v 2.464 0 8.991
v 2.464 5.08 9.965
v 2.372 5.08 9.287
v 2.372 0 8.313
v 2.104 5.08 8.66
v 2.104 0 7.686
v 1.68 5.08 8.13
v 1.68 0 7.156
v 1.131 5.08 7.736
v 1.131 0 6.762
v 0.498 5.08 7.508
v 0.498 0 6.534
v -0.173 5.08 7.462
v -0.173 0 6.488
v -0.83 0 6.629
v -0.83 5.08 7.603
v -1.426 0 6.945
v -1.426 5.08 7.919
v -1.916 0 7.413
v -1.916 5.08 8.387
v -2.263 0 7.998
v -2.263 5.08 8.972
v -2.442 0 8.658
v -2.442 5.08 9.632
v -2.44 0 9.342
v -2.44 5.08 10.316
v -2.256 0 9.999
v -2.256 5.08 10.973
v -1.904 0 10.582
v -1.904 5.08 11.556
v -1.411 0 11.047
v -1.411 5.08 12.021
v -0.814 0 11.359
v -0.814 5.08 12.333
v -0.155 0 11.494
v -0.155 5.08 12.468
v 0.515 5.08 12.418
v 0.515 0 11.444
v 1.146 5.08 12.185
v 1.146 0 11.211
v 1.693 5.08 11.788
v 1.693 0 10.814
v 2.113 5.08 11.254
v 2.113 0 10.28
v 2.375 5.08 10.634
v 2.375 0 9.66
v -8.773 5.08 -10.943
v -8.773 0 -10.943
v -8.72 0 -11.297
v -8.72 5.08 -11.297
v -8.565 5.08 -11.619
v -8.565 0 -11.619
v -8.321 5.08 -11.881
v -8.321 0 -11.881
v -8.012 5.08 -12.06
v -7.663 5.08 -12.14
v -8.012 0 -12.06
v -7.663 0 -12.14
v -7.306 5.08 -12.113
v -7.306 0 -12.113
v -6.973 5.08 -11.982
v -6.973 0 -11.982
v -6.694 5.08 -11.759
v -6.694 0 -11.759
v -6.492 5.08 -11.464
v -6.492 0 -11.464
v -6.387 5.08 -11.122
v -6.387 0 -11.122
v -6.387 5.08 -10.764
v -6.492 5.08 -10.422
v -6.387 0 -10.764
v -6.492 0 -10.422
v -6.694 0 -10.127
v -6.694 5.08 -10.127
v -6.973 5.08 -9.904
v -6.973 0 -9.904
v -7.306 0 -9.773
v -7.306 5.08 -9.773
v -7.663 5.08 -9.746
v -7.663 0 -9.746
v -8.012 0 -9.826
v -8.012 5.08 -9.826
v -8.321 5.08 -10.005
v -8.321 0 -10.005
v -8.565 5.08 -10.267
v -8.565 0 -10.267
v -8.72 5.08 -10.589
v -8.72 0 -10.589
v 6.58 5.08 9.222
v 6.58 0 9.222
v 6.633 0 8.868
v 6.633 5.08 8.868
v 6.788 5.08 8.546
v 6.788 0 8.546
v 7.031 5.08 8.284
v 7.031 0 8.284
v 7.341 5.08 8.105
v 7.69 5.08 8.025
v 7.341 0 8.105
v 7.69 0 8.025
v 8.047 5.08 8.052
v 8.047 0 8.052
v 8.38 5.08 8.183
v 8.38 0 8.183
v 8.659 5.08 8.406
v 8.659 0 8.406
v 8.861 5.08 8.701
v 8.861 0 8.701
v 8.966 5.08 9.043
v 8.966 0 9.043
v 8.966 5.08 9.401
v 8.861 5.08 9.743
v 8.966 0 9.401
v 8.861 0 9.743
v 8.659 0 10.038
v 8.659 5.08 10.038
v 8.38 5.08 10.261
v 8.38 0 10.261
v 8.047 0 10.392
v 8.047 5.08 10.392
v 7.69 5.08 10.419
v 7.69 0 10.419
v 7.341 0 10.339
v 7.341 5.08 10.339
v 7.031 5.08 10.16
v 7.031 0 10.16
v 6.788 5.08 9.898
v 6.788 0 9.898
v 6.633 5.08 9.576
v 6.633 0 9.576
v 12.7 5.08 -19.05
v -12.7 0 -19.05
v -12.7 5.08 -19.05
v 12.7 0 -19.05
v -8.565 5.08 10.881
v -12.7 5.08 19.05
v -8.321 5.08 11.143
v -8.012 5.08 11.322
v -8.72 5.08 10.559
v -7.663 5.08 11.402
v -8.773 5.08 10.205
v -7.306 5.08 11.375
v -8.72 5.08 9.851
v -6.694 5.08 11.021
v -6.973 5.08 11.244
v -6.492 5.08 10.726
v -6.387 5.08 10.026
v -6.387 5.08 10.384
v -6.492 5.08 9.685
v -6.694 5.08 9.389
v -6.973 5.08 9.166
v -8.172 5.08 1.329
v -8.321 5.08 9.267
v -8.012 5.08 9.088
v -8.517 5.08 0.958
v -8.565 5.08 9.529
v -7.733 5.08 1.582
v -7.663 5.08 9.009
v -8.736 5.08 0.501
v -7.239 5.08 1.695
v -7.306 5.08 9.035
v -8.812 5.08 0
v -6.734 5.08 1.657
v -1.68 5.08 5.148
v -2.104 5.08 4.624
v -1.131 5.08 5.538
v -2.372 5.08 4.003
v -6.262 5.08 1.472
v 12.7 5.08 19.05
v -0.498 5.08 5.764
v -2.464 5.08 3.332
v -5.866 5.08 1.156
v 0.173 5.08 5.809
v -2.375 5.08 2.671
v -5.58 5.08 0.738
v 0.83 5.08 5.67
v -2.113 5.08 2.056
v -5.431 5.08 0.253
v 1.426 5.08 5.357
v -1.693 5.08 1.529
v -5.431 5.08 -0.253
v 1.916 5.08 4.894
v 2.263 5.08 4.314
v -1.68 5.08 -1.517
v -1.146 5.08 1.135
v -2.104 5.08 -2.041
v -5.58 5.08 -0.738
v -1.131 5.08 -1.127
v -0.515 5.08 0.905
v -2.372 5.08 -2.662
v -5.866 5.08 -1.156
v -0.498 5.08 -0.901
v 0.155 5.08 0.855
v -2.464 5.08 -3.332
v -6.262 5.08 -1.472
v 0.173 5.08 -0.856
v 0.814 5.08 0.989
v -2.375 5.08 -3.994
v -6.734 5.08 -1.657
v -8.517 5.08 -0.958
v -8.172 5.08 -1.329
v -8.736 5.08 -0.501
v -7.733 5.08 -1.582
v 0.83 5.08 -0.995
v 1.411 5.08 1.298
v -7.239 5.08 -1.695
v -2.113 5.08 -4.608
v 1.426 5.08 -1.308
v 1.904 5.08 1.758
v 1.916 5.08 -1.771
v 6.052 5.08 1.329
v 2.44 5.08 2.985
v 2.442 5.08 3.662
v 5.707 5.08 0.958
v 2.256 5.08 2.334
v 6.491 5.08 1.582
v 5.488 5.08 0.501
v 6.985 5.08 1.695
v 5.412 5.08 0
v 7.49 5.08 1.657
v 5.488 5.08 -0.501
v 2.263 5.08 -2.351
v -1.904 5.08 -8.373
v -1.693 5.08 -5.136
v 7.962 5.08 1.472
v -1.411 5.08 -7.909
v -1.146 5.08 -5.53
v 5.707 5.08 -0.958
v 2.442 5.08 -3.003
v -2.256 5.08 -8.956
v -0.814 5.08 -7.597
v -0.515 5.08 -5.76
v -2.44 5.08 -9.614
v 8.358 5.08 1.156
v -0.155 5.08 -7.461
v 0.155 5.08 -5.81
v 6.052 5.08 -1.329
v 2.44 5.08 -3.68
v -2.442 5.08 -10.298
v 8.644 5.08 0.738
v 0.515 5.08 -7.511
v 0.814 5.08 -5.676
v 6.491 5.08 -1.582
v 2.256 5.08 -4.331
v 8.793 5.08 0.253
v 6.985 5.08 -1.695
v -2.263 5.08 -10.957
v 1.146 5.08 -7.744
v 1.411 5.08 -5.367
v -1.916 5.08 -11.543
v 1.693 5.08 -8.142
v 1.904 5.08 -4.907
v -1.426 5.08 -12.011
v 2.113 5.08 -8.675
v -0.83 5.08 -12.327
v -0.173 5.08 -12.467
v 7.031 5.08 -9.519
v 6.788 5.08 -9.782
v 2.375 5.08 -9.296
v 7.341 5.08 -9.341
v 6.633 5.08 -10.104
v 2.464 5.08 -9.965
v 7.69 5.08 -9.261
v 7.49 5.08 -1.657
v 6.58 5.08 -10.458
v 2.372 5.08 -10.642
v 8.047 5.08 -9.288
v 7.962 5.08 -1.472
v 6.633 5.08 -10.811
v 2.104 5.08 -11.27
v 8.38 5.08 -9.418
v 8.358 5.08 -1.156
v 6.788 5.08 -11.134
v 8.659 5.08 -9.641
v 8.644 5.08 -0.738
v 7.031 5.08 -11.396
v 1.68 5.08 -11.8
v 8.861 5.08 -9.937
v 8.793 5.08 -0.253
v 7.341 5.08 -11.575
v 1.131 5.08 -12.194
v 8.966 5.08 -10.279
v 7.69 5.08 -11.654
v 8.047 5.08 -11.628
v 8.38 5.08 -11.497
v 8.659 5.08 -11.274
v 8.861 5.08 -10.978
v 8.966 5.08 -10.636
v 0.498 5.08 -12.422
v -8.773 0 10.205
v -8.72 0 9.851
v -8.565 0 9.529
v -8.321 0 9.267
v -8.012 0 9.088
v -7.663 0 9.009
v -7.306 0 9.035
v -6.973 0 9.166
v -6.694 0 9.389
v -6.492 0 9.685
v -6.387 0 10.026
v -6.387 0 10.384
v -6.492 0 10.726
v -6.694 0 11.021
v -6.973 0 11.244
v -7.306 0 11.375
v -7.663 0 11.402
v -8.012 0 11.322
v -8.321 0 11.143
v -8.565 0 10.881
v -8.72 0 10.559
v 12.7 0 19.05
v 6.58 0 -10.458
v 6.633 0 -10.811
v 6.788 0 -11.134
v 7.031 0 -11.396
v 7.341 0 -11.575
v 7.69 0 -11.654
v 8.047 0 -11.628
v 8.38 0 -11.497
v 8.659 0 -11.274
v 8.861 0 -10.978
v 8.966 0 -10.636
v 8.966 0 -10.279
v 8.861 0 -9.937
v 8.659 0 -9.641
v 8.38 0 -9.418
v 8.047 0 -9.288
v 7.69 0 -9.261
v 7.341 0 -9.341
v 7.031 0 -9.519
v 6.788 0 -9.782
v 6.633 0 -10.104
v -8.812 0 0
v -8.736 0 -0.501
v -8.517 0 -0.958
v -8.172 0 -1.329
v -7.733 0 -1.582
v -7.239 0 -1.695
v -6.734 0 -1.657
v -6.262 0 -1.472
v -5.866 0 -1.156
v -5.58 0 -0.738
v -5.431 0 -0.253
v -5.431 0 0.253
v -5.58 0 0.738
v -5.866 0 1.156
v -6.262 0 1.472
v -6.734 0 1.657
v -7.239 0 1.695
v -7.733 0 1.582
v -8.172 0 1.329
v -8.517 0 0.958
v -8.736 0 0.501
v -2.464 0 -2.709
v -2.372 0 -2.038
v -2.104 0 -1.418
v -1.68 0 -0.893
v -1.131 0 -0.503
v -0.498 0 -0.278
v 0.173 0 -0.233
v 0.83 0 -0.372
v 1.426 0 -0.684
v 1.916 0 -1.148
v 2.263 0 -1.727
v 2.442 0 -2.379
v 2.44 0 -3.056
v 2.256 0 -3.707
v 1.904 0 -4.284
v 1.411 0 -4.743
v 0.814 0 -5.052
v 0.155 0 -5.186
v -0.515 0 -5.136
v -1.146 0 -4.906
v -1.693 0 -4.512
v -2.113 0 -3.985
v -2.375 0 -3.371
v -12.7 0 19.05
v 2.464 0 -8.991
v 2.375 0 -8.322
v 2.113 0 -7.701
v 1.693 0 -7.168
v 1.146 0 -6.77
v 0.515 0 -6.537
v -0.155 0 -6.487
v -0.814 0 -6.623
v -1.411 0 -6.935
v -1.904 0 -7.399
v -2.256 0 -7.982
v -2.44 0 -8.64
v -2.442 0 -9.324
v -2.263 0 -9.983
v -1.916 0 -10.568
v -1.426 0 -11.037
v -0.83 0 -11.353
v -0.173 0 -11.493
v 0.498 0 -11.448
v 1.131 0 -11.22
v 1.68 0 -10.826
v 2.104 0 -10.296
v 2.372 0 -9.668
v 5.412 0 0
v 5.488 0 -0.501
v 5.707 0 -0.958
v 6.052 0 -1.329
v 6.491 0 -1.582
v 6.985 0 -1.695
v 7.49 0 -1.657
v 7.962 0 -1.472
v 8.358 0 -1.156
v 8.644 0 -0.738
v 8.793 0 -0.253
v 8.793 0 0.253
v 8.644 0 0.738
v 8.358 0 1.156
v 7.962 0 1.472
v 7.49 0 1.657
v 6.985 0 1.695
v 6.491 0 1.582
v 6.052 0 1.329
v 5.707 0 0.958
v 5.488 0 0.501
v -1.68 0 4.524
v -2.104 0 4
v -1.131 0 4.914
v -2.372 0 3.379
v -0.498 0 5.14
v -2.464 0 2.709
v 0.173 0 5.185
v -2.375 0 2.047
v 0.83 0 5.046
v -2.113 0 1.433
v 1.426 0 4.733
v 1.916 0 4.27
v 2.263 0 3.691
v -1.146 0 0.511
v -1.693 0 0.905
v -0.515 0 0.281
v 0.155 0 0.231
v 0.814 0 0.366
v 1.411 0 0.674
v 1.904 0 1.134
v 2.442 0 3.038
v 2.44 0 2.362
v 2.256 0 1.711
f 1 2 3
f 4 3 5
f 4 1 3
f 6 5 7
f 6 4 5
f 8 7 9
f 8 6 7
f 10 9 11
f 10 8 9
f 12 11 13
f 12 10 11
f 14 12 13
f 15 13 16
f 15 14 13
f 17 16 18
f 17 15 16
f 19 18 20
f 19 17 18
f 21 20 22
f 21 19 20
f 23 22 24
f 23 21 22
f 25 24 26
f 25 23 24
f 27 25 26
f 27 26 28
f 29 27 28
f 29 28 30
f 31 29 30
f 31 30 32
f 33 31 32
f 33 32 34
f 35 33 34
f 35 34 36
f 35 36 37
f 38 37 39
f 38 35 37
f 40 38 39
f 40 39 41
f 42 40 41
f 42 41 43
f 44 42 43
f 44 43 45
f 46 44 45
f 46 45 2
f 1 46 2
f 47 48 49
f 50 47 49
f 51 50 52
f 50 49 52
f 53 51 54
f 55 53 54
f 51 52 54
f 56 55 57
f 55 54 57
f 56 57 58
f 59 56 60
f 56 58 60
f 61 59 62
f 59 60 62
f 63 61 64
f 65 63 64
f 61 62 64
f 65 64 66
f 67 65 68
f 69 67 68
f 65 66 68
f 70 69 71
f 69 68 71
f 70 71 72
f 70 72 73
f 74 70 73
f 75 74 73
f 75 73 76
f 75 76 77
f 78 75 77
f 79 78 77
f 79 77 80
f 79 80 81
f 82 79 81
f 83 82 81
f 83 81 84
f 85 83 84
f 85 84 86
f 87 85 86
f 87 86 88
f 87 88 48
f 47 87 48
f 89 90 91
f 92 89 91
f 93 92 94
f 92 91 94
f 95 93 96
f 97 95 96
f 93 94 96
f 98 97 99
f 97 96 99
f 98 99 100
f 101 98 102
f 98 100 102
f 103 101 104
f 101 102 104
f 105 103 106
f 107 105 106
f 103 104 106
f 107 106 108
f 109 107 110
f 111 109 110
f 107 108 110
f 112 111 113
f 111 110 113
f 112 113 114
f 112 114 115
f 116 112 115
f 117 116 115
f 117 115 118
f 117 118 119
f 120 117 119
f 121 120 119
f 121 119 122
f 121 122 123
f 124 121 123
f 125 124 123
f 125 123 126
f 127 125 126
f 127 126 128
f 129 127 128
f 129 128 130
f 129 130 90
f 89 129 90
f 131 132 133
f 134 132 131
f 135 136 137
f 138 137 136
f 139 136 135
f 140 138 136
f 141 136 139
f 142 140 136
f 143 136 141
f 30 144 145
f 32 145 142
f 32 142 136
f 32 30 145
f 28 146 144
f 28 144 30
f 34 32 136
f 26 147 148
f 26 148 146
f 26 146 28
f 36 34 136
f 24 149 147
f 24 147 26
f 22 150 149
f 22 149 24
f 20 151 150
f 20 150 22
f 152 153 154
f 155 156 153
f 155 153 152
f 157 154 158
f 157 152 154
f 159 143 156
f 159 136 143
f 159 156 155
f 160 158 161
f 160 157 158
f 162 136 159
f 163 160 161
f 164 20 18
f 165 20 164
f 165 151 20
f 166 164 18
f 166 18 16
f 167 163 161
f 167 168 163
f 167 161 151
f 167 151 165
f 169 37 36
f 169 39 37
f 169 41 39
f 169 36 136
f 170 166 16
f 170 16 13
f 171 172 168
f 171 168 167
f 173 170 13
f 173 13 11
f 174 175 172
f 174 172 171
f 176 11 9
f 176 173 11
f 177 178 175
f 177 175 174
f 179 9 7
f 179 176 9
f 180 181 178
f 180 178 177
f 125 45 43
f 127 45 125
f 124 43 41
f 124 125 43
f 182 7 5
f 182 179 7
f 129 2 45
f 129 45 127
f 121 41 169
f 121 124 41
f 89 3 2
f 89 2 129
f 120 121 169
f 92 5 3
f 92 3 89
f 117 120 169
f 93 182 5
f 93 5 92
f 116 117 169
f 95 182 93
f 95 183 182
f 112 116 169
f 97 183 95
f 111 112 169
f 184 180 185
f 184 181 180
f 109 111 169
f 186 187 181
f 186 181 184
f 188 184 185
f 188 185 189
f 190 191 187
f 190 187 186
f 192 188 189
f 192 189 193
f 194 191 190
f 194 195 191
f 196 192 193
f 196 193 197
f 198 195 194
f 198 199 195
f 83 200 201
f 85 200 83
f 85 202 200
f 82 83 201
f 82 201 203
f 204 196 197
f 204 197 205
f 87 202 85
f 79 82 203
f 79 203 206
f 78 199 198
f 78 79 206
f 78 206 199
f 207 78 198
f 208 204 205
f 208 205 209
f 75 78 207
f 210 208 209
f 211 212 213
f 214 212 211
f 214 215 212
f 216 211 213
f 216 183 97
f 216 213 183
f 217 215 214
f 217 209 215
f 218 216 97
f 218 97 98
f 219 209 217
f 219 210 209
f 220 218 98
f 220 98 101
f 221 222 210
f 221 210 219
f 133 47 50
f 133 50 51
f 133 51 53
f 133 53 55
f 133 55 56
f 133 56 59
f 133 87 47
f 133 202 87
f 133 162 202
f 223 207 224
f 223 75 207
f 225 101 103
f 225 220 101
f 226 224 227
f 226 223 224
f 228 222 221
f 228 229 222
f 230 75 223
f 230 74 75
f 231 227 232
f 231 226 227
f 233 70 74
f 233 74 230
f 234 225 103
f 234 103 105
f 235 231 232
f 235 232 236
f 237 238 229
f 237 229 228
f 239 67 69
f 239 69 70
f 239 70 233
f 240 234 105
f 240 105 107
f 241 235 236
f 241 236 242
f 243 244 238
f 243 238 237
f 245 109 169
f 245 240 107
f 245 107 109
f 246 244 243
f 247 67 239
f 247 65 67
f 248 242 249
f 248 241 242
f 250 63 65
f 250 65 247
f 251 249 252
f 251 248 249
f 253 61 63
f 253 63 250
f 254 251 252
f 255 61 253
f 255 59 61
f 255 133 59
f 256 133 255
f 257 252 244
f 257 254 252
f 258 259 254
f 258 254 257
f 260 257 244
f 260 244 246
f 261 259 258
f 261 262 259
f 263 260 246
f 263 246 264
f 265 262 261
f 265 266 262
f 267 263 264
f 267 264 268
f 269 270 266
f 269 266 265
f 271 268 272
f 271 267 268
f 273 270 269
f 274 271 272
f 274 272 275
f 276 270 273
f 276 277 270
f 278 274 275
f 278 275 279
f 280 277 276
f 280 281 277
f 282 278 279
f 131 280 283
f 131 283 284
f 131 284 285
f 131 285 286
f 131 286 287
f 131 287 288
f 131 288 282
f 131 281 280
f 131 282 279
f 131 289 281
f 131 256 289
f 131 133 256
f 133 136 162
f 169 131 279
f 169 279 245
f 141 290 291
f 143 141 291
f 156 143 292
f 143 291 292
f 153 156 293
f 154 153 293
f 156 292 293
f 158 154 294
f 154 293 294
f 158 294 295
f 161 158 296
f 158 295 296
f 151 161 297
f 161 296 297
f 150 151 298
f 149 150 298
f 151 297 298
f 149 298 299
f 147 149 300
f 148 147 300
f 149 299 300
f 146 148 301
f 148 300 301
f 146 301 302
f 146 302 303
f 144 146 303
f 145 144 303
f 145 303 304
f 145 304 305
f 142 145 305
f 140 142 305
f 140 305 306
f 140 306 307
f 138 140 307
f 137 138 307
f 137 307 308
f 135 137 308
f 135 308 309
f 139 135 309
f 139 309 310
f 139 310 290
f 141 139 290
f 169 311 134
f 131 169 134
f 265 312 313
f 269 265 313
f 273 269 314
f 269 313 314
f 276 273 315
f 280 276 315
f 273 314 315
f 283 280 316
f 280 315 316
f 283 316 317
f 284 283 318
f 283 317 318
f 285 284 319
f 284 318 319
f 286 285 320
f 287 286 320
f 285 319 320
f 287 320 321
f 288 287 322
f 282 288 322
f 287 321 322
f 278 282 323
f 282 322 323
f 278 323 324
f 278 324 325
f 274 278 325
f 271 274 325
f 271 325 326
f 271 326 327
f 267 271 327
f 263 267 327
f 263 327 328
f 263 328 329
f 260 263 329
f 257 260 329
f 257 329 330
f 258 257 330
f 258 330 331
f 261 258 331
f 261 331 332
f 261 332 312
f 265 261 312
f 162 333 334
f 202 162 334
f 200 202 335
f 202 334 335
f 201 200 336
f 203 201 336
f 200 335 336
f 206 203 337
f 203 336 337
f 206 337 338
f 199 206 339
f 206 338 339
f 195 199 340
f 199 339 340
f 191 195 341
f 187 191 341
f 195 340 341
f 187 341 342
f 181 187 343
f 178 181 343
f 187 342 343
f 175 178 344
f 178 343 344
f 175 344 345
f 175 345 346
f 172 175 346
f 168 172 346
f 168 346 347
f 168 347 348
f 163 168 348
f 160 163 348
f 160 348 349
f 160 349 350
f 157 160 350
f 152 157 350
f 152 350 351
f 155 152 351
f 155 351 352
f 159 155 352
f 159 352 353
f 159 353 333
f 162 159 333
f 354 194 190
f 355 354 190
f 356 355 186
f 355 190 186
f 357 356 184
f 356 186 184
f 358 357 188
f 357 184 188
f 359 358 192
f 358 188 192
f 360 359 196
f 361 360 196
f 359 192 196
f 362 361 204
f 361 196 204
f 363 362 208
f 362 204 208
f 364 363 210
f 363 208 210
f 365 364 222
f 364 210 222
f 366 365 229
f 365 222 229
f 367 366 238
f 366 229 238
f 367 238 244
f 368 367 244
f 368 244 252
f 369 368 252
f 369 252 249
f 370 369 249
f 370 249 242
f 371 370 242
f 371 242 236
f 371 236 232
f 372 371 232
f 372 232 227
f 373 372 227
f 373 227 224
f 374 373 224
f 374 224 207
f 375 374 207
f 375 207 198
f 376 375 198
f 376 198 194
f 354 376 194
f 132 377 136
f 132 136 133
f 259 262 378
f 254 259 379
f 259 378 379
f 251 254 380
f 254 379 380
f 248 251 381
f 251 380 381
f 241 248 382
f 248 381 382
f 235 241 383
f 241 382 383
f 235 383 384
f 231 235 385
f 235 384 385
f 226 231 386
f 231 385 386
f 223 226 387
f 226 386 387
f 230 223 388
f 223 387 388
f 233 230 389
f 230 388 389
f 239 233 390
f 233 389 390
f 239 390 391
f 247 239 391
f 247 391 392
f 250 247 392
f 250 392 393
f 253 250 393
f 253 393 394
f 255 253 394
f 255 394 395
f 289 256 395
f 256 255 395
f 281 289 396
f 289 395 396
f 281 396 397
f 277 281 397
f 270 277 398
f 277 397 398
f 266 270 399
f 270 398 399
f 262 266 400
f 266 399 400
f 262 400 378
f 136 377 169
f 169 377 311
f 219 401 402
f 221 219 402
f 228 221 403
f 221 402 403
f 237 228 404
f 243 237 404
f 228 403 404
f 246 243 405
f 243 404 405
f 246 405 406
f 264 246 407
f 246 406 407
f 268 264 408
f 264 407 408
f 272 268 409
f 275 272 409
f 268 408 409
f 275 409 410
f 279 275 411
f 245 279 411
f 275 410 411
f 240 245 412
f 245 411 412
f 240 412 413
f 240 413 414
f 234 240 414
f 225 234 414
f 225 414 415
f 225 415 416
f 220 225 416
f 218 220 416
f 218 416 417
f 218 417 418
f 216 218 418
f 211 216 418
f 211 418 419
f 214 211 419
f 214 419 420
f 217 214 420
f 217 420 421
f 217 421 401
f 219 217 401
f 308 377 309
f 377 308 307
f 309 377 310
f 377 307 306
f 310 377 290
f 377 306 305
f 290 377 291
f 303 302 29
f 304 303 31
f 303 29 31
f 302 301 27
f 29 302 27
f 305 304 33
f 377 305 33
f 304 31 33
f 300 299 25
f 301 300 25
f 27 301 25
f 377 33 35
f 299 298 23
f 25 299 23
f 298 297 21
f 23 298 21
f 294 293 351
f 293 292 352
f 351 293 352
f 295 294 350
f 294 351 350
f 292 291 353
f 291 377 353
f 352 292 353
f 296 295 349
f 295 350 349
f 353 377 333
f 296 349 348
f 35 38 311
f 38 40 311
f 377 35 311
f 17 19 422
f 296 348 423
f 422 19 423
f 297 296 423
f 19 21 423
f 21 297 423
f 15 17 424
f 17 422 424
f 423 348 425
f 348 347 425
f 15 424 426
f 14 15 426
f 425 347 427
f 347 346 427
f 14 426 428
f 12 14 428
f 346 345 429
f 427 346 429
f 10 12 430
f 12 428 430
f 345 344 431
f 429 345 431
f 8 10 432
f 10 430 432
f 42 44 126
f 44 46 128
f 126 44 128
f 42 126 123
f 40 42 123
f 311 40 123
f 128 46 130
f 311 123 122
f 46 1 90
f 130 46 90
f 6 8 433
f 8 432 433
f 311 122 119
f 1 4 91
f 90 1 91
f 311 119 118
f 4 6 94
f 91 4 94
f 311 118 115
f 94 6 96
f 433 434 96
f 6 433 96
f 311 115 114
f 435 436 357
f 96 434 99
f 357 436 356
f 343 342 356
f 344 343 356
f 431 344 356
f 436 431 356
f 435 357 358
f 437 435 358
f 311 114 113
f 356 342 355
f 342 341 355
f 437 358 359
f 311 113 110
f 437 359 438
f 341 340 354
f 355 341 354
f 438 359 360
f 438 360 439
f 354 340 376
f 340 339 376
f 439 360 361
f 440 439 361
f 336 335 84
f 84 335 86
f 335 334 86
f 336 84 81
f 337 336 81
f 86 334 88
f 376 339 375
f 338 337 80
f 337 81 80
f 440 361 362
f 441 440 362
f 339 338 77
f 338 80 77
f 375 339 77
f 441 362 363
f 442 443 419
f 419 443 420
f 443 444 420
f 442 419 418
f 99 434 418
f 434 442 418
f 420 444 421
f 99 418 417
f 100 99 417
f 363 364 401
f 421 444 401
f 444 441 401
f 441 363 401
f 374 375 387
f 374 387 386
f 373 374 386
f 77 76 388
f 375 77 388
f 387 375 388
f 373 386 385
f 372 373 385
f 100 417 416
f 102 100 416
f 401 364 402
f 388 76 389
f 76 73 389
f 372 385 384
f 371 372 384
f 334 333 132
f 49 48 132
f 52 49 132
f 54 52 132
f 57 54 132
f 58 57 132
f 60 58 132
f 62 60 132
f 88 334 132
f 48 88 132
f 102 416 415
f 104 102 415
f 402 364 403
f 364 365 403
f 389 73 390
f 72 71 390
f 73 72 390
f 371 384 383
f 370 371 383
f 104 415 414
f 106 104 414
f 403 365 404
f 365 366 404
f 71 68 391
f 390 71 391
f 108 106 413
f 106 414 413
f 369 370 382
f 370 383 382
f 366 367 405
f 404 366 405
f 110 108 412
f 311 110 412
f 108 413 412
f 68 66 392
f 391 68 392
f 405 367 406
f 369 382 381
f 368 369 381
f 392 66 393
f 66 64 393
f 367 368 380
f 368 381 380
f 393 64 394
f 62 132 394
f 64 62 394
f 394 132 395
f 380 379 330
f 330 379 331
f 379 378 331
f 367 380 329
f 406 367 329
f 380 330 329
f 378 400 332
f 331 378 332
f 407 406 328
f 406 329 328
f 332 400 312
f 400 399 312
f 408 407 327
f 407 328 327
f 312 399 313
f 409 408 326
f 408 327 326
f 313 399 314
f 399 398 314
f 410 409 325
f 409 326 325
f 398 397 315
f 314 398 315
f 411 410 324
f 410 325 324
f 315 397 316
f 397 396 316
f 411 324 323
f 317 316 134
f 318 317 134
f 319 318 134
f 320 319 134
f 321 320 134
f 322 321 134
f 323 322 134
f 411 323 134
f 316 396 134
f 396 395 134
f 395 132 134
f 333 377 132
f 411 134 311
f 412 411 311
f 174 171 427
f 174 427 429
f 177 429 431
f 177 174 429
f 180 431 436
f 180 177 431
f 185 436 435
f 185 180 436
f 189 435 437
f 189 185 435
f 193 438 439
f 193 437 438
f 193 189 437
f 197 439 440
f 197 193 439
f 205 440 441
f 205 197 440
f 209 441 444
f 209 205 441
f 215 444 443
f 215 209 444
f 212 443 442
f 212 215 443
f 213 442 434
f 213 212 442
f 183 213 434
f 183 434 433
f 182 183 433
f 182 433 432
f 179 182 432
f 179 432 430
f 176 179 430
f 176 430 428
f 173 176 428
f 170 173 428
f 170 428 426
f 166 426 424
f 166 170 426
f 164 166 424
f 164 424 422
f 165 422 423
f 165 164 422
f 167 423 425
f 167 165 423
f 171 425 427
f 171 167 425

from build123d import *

# Parameters (mm, degrees)
SKETCH2_W                = 25.4
SKETCH2_H                = 38.1
BOSS_EXTRUDE1_DEPTH      = 5.08
CUT_EXTRUDE1_START       = -2.790735945
SKETCH7_R                = 2.4638
CUT_EXTRUDE1_DEPTH       = 11.685356434
CUT_EXTRUDE2_START       = -12.037410464
SKETCH16_R               = 2.4638
CUT_EXTRUDE2_DEPTH       = 14.163842911
M3_CLEARANCE_HOLE1_D     = 3.4
M3_CLEARANCE_HOLE1_DEPTH = 25.4
M3_CLEARANCE_HOLE1_TIP   = 1.021463052
M2_CLEARANCE_HOLE1_D     = 2.4
M2_CLEARANCE_HOLE1_DEPTH = 25.4
M2_CLEARANCE_HOLE1_TIP   = 0.721032743
M2_CLEARANCE_HOLE2_D     = 2.4
M2_CLEARANCE_HOLE2_DEPTH = 25.4
M2_CLEARANCE_HOLE2_TIP   = 0.721032743


with BuildPart() as part:
    # Sketch2 → Boss-Extrude1 (new body)
    with BuildSketch(Plane(origin=(0, 0, 0), x_dir=(1, 0, 0), z_dir=(0, 1, 0))):
        Rectangle(SKETCH2_W, SKETCH2_H)
    extrude(amount=BOSS_EXTRUDE1_DEPTH)

    # Sketch7 → Cut-Extrude1 (cut)
    with BuildSketch(Plane(origin=(12.7, 5.08, 4.3561), x_dir=(-1, 0, 0), z_dir=(0, -0.992546152, -0.121869343)).offset(CUT_EXTRUDE1_START)):
        with Locations((12.7, 1.016)):
            Circle(SKETCH7_R)
    cut_extrude1 = extrude(amount=CUT_EXTRUDE1_DEPTH, mode=Mode.SUBTRACT)

    # Sketch16 → Cut-Extrude2 (cut)
    with BuildSketch(Plane(origin=(12.7, 5.08, 13.0683), x_dir=(1, 0, 0), z_dir=(0, 0.982109046, 0.188313096)).offset(CUT_EXTRUDE2_START)):
        with Locations((-12.7, 3.048)):
            Circle(SKETCH16_R)
    cut_extrude2 = extrude(amount=CUT_EXTRUDE2_DEPTH, mode=Mode.SUBTRACT)

    # Mirror2: Cut-Extrude1, Cut-Extrude2 across plane
    add(cut_extrude1.mirror(Plane(origin=(0, 0, 0), x_dir=(1, 0, 0), z_dir=(0, 0, -1))), mode=Mode.SUBTRACT)
    add(cut_extrude2.mirror(Plane(origin=(0, 0, 0), x_dir=(1, 0, 0), z_dir=(0, 0, -1))), mode=Mode.SUBTRACT)

    # M3 Clearance Hole1
    with Locations(Plane(origin=(0, 5.08, 0), x_dir=(1, 0, 0), z_dir=(0, 1, 0))):
        with Locations((7.112, 0), (-7.112, 0)):
            Hole(M3_CLEARANCE_HOLE1_D / 2, depth=M3_CLEARANCE_HOLE1_DEPTH)
            with Locations((0, 0, -(M3_CLEARANCE_HOLE1_DEPTH + M3_CLEARANCE_HOLE1_TIP / 2))):  # 118° drill point
                Cone(0, M3_CLEARANCE_HOLE1_D / 2, M3_CLEARANCE_HOLE1_TIP, mode=Mode.SUBTRACT)

    # M2 Clearance Hole1
    with Locations(Plane(origin=(0, 5.08, 0), x_dir=(1, 0, 0), z_dir=(0, 1, 0))):
        with Locations((-7.573257477, -10.205203742), (-7.573257477, 10.942943937)):
            Hole(M2_CLEARANCE_HOLE1_D / 2, depth=M2_CLEARANCE_HOLE1_DEPTH)
            with Locations((0, 0, -(M2_CLEARANCE_HOLE1_DEPTH + M2_CLEARANCE_HOLE1_TIP / 2))):  # 118° drill point
                Cone(0, M2_CLEARANCE_HOLE1_D / 2, M2_CLEARANCE_HOLE1_TIP, mode=Mode.SUBTRACT)

    # M2 Clearance Hole2
    with Locations(Plane(origin=(0, 5.08, 0), x_dir=(1, 0, 0), z_dir=(0, 1, 0))):
        with Locations((7.779654049, -9.22186476), (7.779654049, 10.457647724)):
            Hole(M2_CLEARANCE_HOLE2_D / 2, depth=M2_CLEARANCE_HOLE2_DEPTH)
            with Locations((0, 0, -(M2_CLEARANCE_HOLE2_DEPTH + M2_CLEARANCE_HOLE2_TIP / 2))):  # 118° drill point
                Cone(0, M2_CLEARANCE_HOLE2_D / 2, M2_CLEARANCE_HOLE2_TIP, mode=Mode.SUBTRACT)


solid = part.part
